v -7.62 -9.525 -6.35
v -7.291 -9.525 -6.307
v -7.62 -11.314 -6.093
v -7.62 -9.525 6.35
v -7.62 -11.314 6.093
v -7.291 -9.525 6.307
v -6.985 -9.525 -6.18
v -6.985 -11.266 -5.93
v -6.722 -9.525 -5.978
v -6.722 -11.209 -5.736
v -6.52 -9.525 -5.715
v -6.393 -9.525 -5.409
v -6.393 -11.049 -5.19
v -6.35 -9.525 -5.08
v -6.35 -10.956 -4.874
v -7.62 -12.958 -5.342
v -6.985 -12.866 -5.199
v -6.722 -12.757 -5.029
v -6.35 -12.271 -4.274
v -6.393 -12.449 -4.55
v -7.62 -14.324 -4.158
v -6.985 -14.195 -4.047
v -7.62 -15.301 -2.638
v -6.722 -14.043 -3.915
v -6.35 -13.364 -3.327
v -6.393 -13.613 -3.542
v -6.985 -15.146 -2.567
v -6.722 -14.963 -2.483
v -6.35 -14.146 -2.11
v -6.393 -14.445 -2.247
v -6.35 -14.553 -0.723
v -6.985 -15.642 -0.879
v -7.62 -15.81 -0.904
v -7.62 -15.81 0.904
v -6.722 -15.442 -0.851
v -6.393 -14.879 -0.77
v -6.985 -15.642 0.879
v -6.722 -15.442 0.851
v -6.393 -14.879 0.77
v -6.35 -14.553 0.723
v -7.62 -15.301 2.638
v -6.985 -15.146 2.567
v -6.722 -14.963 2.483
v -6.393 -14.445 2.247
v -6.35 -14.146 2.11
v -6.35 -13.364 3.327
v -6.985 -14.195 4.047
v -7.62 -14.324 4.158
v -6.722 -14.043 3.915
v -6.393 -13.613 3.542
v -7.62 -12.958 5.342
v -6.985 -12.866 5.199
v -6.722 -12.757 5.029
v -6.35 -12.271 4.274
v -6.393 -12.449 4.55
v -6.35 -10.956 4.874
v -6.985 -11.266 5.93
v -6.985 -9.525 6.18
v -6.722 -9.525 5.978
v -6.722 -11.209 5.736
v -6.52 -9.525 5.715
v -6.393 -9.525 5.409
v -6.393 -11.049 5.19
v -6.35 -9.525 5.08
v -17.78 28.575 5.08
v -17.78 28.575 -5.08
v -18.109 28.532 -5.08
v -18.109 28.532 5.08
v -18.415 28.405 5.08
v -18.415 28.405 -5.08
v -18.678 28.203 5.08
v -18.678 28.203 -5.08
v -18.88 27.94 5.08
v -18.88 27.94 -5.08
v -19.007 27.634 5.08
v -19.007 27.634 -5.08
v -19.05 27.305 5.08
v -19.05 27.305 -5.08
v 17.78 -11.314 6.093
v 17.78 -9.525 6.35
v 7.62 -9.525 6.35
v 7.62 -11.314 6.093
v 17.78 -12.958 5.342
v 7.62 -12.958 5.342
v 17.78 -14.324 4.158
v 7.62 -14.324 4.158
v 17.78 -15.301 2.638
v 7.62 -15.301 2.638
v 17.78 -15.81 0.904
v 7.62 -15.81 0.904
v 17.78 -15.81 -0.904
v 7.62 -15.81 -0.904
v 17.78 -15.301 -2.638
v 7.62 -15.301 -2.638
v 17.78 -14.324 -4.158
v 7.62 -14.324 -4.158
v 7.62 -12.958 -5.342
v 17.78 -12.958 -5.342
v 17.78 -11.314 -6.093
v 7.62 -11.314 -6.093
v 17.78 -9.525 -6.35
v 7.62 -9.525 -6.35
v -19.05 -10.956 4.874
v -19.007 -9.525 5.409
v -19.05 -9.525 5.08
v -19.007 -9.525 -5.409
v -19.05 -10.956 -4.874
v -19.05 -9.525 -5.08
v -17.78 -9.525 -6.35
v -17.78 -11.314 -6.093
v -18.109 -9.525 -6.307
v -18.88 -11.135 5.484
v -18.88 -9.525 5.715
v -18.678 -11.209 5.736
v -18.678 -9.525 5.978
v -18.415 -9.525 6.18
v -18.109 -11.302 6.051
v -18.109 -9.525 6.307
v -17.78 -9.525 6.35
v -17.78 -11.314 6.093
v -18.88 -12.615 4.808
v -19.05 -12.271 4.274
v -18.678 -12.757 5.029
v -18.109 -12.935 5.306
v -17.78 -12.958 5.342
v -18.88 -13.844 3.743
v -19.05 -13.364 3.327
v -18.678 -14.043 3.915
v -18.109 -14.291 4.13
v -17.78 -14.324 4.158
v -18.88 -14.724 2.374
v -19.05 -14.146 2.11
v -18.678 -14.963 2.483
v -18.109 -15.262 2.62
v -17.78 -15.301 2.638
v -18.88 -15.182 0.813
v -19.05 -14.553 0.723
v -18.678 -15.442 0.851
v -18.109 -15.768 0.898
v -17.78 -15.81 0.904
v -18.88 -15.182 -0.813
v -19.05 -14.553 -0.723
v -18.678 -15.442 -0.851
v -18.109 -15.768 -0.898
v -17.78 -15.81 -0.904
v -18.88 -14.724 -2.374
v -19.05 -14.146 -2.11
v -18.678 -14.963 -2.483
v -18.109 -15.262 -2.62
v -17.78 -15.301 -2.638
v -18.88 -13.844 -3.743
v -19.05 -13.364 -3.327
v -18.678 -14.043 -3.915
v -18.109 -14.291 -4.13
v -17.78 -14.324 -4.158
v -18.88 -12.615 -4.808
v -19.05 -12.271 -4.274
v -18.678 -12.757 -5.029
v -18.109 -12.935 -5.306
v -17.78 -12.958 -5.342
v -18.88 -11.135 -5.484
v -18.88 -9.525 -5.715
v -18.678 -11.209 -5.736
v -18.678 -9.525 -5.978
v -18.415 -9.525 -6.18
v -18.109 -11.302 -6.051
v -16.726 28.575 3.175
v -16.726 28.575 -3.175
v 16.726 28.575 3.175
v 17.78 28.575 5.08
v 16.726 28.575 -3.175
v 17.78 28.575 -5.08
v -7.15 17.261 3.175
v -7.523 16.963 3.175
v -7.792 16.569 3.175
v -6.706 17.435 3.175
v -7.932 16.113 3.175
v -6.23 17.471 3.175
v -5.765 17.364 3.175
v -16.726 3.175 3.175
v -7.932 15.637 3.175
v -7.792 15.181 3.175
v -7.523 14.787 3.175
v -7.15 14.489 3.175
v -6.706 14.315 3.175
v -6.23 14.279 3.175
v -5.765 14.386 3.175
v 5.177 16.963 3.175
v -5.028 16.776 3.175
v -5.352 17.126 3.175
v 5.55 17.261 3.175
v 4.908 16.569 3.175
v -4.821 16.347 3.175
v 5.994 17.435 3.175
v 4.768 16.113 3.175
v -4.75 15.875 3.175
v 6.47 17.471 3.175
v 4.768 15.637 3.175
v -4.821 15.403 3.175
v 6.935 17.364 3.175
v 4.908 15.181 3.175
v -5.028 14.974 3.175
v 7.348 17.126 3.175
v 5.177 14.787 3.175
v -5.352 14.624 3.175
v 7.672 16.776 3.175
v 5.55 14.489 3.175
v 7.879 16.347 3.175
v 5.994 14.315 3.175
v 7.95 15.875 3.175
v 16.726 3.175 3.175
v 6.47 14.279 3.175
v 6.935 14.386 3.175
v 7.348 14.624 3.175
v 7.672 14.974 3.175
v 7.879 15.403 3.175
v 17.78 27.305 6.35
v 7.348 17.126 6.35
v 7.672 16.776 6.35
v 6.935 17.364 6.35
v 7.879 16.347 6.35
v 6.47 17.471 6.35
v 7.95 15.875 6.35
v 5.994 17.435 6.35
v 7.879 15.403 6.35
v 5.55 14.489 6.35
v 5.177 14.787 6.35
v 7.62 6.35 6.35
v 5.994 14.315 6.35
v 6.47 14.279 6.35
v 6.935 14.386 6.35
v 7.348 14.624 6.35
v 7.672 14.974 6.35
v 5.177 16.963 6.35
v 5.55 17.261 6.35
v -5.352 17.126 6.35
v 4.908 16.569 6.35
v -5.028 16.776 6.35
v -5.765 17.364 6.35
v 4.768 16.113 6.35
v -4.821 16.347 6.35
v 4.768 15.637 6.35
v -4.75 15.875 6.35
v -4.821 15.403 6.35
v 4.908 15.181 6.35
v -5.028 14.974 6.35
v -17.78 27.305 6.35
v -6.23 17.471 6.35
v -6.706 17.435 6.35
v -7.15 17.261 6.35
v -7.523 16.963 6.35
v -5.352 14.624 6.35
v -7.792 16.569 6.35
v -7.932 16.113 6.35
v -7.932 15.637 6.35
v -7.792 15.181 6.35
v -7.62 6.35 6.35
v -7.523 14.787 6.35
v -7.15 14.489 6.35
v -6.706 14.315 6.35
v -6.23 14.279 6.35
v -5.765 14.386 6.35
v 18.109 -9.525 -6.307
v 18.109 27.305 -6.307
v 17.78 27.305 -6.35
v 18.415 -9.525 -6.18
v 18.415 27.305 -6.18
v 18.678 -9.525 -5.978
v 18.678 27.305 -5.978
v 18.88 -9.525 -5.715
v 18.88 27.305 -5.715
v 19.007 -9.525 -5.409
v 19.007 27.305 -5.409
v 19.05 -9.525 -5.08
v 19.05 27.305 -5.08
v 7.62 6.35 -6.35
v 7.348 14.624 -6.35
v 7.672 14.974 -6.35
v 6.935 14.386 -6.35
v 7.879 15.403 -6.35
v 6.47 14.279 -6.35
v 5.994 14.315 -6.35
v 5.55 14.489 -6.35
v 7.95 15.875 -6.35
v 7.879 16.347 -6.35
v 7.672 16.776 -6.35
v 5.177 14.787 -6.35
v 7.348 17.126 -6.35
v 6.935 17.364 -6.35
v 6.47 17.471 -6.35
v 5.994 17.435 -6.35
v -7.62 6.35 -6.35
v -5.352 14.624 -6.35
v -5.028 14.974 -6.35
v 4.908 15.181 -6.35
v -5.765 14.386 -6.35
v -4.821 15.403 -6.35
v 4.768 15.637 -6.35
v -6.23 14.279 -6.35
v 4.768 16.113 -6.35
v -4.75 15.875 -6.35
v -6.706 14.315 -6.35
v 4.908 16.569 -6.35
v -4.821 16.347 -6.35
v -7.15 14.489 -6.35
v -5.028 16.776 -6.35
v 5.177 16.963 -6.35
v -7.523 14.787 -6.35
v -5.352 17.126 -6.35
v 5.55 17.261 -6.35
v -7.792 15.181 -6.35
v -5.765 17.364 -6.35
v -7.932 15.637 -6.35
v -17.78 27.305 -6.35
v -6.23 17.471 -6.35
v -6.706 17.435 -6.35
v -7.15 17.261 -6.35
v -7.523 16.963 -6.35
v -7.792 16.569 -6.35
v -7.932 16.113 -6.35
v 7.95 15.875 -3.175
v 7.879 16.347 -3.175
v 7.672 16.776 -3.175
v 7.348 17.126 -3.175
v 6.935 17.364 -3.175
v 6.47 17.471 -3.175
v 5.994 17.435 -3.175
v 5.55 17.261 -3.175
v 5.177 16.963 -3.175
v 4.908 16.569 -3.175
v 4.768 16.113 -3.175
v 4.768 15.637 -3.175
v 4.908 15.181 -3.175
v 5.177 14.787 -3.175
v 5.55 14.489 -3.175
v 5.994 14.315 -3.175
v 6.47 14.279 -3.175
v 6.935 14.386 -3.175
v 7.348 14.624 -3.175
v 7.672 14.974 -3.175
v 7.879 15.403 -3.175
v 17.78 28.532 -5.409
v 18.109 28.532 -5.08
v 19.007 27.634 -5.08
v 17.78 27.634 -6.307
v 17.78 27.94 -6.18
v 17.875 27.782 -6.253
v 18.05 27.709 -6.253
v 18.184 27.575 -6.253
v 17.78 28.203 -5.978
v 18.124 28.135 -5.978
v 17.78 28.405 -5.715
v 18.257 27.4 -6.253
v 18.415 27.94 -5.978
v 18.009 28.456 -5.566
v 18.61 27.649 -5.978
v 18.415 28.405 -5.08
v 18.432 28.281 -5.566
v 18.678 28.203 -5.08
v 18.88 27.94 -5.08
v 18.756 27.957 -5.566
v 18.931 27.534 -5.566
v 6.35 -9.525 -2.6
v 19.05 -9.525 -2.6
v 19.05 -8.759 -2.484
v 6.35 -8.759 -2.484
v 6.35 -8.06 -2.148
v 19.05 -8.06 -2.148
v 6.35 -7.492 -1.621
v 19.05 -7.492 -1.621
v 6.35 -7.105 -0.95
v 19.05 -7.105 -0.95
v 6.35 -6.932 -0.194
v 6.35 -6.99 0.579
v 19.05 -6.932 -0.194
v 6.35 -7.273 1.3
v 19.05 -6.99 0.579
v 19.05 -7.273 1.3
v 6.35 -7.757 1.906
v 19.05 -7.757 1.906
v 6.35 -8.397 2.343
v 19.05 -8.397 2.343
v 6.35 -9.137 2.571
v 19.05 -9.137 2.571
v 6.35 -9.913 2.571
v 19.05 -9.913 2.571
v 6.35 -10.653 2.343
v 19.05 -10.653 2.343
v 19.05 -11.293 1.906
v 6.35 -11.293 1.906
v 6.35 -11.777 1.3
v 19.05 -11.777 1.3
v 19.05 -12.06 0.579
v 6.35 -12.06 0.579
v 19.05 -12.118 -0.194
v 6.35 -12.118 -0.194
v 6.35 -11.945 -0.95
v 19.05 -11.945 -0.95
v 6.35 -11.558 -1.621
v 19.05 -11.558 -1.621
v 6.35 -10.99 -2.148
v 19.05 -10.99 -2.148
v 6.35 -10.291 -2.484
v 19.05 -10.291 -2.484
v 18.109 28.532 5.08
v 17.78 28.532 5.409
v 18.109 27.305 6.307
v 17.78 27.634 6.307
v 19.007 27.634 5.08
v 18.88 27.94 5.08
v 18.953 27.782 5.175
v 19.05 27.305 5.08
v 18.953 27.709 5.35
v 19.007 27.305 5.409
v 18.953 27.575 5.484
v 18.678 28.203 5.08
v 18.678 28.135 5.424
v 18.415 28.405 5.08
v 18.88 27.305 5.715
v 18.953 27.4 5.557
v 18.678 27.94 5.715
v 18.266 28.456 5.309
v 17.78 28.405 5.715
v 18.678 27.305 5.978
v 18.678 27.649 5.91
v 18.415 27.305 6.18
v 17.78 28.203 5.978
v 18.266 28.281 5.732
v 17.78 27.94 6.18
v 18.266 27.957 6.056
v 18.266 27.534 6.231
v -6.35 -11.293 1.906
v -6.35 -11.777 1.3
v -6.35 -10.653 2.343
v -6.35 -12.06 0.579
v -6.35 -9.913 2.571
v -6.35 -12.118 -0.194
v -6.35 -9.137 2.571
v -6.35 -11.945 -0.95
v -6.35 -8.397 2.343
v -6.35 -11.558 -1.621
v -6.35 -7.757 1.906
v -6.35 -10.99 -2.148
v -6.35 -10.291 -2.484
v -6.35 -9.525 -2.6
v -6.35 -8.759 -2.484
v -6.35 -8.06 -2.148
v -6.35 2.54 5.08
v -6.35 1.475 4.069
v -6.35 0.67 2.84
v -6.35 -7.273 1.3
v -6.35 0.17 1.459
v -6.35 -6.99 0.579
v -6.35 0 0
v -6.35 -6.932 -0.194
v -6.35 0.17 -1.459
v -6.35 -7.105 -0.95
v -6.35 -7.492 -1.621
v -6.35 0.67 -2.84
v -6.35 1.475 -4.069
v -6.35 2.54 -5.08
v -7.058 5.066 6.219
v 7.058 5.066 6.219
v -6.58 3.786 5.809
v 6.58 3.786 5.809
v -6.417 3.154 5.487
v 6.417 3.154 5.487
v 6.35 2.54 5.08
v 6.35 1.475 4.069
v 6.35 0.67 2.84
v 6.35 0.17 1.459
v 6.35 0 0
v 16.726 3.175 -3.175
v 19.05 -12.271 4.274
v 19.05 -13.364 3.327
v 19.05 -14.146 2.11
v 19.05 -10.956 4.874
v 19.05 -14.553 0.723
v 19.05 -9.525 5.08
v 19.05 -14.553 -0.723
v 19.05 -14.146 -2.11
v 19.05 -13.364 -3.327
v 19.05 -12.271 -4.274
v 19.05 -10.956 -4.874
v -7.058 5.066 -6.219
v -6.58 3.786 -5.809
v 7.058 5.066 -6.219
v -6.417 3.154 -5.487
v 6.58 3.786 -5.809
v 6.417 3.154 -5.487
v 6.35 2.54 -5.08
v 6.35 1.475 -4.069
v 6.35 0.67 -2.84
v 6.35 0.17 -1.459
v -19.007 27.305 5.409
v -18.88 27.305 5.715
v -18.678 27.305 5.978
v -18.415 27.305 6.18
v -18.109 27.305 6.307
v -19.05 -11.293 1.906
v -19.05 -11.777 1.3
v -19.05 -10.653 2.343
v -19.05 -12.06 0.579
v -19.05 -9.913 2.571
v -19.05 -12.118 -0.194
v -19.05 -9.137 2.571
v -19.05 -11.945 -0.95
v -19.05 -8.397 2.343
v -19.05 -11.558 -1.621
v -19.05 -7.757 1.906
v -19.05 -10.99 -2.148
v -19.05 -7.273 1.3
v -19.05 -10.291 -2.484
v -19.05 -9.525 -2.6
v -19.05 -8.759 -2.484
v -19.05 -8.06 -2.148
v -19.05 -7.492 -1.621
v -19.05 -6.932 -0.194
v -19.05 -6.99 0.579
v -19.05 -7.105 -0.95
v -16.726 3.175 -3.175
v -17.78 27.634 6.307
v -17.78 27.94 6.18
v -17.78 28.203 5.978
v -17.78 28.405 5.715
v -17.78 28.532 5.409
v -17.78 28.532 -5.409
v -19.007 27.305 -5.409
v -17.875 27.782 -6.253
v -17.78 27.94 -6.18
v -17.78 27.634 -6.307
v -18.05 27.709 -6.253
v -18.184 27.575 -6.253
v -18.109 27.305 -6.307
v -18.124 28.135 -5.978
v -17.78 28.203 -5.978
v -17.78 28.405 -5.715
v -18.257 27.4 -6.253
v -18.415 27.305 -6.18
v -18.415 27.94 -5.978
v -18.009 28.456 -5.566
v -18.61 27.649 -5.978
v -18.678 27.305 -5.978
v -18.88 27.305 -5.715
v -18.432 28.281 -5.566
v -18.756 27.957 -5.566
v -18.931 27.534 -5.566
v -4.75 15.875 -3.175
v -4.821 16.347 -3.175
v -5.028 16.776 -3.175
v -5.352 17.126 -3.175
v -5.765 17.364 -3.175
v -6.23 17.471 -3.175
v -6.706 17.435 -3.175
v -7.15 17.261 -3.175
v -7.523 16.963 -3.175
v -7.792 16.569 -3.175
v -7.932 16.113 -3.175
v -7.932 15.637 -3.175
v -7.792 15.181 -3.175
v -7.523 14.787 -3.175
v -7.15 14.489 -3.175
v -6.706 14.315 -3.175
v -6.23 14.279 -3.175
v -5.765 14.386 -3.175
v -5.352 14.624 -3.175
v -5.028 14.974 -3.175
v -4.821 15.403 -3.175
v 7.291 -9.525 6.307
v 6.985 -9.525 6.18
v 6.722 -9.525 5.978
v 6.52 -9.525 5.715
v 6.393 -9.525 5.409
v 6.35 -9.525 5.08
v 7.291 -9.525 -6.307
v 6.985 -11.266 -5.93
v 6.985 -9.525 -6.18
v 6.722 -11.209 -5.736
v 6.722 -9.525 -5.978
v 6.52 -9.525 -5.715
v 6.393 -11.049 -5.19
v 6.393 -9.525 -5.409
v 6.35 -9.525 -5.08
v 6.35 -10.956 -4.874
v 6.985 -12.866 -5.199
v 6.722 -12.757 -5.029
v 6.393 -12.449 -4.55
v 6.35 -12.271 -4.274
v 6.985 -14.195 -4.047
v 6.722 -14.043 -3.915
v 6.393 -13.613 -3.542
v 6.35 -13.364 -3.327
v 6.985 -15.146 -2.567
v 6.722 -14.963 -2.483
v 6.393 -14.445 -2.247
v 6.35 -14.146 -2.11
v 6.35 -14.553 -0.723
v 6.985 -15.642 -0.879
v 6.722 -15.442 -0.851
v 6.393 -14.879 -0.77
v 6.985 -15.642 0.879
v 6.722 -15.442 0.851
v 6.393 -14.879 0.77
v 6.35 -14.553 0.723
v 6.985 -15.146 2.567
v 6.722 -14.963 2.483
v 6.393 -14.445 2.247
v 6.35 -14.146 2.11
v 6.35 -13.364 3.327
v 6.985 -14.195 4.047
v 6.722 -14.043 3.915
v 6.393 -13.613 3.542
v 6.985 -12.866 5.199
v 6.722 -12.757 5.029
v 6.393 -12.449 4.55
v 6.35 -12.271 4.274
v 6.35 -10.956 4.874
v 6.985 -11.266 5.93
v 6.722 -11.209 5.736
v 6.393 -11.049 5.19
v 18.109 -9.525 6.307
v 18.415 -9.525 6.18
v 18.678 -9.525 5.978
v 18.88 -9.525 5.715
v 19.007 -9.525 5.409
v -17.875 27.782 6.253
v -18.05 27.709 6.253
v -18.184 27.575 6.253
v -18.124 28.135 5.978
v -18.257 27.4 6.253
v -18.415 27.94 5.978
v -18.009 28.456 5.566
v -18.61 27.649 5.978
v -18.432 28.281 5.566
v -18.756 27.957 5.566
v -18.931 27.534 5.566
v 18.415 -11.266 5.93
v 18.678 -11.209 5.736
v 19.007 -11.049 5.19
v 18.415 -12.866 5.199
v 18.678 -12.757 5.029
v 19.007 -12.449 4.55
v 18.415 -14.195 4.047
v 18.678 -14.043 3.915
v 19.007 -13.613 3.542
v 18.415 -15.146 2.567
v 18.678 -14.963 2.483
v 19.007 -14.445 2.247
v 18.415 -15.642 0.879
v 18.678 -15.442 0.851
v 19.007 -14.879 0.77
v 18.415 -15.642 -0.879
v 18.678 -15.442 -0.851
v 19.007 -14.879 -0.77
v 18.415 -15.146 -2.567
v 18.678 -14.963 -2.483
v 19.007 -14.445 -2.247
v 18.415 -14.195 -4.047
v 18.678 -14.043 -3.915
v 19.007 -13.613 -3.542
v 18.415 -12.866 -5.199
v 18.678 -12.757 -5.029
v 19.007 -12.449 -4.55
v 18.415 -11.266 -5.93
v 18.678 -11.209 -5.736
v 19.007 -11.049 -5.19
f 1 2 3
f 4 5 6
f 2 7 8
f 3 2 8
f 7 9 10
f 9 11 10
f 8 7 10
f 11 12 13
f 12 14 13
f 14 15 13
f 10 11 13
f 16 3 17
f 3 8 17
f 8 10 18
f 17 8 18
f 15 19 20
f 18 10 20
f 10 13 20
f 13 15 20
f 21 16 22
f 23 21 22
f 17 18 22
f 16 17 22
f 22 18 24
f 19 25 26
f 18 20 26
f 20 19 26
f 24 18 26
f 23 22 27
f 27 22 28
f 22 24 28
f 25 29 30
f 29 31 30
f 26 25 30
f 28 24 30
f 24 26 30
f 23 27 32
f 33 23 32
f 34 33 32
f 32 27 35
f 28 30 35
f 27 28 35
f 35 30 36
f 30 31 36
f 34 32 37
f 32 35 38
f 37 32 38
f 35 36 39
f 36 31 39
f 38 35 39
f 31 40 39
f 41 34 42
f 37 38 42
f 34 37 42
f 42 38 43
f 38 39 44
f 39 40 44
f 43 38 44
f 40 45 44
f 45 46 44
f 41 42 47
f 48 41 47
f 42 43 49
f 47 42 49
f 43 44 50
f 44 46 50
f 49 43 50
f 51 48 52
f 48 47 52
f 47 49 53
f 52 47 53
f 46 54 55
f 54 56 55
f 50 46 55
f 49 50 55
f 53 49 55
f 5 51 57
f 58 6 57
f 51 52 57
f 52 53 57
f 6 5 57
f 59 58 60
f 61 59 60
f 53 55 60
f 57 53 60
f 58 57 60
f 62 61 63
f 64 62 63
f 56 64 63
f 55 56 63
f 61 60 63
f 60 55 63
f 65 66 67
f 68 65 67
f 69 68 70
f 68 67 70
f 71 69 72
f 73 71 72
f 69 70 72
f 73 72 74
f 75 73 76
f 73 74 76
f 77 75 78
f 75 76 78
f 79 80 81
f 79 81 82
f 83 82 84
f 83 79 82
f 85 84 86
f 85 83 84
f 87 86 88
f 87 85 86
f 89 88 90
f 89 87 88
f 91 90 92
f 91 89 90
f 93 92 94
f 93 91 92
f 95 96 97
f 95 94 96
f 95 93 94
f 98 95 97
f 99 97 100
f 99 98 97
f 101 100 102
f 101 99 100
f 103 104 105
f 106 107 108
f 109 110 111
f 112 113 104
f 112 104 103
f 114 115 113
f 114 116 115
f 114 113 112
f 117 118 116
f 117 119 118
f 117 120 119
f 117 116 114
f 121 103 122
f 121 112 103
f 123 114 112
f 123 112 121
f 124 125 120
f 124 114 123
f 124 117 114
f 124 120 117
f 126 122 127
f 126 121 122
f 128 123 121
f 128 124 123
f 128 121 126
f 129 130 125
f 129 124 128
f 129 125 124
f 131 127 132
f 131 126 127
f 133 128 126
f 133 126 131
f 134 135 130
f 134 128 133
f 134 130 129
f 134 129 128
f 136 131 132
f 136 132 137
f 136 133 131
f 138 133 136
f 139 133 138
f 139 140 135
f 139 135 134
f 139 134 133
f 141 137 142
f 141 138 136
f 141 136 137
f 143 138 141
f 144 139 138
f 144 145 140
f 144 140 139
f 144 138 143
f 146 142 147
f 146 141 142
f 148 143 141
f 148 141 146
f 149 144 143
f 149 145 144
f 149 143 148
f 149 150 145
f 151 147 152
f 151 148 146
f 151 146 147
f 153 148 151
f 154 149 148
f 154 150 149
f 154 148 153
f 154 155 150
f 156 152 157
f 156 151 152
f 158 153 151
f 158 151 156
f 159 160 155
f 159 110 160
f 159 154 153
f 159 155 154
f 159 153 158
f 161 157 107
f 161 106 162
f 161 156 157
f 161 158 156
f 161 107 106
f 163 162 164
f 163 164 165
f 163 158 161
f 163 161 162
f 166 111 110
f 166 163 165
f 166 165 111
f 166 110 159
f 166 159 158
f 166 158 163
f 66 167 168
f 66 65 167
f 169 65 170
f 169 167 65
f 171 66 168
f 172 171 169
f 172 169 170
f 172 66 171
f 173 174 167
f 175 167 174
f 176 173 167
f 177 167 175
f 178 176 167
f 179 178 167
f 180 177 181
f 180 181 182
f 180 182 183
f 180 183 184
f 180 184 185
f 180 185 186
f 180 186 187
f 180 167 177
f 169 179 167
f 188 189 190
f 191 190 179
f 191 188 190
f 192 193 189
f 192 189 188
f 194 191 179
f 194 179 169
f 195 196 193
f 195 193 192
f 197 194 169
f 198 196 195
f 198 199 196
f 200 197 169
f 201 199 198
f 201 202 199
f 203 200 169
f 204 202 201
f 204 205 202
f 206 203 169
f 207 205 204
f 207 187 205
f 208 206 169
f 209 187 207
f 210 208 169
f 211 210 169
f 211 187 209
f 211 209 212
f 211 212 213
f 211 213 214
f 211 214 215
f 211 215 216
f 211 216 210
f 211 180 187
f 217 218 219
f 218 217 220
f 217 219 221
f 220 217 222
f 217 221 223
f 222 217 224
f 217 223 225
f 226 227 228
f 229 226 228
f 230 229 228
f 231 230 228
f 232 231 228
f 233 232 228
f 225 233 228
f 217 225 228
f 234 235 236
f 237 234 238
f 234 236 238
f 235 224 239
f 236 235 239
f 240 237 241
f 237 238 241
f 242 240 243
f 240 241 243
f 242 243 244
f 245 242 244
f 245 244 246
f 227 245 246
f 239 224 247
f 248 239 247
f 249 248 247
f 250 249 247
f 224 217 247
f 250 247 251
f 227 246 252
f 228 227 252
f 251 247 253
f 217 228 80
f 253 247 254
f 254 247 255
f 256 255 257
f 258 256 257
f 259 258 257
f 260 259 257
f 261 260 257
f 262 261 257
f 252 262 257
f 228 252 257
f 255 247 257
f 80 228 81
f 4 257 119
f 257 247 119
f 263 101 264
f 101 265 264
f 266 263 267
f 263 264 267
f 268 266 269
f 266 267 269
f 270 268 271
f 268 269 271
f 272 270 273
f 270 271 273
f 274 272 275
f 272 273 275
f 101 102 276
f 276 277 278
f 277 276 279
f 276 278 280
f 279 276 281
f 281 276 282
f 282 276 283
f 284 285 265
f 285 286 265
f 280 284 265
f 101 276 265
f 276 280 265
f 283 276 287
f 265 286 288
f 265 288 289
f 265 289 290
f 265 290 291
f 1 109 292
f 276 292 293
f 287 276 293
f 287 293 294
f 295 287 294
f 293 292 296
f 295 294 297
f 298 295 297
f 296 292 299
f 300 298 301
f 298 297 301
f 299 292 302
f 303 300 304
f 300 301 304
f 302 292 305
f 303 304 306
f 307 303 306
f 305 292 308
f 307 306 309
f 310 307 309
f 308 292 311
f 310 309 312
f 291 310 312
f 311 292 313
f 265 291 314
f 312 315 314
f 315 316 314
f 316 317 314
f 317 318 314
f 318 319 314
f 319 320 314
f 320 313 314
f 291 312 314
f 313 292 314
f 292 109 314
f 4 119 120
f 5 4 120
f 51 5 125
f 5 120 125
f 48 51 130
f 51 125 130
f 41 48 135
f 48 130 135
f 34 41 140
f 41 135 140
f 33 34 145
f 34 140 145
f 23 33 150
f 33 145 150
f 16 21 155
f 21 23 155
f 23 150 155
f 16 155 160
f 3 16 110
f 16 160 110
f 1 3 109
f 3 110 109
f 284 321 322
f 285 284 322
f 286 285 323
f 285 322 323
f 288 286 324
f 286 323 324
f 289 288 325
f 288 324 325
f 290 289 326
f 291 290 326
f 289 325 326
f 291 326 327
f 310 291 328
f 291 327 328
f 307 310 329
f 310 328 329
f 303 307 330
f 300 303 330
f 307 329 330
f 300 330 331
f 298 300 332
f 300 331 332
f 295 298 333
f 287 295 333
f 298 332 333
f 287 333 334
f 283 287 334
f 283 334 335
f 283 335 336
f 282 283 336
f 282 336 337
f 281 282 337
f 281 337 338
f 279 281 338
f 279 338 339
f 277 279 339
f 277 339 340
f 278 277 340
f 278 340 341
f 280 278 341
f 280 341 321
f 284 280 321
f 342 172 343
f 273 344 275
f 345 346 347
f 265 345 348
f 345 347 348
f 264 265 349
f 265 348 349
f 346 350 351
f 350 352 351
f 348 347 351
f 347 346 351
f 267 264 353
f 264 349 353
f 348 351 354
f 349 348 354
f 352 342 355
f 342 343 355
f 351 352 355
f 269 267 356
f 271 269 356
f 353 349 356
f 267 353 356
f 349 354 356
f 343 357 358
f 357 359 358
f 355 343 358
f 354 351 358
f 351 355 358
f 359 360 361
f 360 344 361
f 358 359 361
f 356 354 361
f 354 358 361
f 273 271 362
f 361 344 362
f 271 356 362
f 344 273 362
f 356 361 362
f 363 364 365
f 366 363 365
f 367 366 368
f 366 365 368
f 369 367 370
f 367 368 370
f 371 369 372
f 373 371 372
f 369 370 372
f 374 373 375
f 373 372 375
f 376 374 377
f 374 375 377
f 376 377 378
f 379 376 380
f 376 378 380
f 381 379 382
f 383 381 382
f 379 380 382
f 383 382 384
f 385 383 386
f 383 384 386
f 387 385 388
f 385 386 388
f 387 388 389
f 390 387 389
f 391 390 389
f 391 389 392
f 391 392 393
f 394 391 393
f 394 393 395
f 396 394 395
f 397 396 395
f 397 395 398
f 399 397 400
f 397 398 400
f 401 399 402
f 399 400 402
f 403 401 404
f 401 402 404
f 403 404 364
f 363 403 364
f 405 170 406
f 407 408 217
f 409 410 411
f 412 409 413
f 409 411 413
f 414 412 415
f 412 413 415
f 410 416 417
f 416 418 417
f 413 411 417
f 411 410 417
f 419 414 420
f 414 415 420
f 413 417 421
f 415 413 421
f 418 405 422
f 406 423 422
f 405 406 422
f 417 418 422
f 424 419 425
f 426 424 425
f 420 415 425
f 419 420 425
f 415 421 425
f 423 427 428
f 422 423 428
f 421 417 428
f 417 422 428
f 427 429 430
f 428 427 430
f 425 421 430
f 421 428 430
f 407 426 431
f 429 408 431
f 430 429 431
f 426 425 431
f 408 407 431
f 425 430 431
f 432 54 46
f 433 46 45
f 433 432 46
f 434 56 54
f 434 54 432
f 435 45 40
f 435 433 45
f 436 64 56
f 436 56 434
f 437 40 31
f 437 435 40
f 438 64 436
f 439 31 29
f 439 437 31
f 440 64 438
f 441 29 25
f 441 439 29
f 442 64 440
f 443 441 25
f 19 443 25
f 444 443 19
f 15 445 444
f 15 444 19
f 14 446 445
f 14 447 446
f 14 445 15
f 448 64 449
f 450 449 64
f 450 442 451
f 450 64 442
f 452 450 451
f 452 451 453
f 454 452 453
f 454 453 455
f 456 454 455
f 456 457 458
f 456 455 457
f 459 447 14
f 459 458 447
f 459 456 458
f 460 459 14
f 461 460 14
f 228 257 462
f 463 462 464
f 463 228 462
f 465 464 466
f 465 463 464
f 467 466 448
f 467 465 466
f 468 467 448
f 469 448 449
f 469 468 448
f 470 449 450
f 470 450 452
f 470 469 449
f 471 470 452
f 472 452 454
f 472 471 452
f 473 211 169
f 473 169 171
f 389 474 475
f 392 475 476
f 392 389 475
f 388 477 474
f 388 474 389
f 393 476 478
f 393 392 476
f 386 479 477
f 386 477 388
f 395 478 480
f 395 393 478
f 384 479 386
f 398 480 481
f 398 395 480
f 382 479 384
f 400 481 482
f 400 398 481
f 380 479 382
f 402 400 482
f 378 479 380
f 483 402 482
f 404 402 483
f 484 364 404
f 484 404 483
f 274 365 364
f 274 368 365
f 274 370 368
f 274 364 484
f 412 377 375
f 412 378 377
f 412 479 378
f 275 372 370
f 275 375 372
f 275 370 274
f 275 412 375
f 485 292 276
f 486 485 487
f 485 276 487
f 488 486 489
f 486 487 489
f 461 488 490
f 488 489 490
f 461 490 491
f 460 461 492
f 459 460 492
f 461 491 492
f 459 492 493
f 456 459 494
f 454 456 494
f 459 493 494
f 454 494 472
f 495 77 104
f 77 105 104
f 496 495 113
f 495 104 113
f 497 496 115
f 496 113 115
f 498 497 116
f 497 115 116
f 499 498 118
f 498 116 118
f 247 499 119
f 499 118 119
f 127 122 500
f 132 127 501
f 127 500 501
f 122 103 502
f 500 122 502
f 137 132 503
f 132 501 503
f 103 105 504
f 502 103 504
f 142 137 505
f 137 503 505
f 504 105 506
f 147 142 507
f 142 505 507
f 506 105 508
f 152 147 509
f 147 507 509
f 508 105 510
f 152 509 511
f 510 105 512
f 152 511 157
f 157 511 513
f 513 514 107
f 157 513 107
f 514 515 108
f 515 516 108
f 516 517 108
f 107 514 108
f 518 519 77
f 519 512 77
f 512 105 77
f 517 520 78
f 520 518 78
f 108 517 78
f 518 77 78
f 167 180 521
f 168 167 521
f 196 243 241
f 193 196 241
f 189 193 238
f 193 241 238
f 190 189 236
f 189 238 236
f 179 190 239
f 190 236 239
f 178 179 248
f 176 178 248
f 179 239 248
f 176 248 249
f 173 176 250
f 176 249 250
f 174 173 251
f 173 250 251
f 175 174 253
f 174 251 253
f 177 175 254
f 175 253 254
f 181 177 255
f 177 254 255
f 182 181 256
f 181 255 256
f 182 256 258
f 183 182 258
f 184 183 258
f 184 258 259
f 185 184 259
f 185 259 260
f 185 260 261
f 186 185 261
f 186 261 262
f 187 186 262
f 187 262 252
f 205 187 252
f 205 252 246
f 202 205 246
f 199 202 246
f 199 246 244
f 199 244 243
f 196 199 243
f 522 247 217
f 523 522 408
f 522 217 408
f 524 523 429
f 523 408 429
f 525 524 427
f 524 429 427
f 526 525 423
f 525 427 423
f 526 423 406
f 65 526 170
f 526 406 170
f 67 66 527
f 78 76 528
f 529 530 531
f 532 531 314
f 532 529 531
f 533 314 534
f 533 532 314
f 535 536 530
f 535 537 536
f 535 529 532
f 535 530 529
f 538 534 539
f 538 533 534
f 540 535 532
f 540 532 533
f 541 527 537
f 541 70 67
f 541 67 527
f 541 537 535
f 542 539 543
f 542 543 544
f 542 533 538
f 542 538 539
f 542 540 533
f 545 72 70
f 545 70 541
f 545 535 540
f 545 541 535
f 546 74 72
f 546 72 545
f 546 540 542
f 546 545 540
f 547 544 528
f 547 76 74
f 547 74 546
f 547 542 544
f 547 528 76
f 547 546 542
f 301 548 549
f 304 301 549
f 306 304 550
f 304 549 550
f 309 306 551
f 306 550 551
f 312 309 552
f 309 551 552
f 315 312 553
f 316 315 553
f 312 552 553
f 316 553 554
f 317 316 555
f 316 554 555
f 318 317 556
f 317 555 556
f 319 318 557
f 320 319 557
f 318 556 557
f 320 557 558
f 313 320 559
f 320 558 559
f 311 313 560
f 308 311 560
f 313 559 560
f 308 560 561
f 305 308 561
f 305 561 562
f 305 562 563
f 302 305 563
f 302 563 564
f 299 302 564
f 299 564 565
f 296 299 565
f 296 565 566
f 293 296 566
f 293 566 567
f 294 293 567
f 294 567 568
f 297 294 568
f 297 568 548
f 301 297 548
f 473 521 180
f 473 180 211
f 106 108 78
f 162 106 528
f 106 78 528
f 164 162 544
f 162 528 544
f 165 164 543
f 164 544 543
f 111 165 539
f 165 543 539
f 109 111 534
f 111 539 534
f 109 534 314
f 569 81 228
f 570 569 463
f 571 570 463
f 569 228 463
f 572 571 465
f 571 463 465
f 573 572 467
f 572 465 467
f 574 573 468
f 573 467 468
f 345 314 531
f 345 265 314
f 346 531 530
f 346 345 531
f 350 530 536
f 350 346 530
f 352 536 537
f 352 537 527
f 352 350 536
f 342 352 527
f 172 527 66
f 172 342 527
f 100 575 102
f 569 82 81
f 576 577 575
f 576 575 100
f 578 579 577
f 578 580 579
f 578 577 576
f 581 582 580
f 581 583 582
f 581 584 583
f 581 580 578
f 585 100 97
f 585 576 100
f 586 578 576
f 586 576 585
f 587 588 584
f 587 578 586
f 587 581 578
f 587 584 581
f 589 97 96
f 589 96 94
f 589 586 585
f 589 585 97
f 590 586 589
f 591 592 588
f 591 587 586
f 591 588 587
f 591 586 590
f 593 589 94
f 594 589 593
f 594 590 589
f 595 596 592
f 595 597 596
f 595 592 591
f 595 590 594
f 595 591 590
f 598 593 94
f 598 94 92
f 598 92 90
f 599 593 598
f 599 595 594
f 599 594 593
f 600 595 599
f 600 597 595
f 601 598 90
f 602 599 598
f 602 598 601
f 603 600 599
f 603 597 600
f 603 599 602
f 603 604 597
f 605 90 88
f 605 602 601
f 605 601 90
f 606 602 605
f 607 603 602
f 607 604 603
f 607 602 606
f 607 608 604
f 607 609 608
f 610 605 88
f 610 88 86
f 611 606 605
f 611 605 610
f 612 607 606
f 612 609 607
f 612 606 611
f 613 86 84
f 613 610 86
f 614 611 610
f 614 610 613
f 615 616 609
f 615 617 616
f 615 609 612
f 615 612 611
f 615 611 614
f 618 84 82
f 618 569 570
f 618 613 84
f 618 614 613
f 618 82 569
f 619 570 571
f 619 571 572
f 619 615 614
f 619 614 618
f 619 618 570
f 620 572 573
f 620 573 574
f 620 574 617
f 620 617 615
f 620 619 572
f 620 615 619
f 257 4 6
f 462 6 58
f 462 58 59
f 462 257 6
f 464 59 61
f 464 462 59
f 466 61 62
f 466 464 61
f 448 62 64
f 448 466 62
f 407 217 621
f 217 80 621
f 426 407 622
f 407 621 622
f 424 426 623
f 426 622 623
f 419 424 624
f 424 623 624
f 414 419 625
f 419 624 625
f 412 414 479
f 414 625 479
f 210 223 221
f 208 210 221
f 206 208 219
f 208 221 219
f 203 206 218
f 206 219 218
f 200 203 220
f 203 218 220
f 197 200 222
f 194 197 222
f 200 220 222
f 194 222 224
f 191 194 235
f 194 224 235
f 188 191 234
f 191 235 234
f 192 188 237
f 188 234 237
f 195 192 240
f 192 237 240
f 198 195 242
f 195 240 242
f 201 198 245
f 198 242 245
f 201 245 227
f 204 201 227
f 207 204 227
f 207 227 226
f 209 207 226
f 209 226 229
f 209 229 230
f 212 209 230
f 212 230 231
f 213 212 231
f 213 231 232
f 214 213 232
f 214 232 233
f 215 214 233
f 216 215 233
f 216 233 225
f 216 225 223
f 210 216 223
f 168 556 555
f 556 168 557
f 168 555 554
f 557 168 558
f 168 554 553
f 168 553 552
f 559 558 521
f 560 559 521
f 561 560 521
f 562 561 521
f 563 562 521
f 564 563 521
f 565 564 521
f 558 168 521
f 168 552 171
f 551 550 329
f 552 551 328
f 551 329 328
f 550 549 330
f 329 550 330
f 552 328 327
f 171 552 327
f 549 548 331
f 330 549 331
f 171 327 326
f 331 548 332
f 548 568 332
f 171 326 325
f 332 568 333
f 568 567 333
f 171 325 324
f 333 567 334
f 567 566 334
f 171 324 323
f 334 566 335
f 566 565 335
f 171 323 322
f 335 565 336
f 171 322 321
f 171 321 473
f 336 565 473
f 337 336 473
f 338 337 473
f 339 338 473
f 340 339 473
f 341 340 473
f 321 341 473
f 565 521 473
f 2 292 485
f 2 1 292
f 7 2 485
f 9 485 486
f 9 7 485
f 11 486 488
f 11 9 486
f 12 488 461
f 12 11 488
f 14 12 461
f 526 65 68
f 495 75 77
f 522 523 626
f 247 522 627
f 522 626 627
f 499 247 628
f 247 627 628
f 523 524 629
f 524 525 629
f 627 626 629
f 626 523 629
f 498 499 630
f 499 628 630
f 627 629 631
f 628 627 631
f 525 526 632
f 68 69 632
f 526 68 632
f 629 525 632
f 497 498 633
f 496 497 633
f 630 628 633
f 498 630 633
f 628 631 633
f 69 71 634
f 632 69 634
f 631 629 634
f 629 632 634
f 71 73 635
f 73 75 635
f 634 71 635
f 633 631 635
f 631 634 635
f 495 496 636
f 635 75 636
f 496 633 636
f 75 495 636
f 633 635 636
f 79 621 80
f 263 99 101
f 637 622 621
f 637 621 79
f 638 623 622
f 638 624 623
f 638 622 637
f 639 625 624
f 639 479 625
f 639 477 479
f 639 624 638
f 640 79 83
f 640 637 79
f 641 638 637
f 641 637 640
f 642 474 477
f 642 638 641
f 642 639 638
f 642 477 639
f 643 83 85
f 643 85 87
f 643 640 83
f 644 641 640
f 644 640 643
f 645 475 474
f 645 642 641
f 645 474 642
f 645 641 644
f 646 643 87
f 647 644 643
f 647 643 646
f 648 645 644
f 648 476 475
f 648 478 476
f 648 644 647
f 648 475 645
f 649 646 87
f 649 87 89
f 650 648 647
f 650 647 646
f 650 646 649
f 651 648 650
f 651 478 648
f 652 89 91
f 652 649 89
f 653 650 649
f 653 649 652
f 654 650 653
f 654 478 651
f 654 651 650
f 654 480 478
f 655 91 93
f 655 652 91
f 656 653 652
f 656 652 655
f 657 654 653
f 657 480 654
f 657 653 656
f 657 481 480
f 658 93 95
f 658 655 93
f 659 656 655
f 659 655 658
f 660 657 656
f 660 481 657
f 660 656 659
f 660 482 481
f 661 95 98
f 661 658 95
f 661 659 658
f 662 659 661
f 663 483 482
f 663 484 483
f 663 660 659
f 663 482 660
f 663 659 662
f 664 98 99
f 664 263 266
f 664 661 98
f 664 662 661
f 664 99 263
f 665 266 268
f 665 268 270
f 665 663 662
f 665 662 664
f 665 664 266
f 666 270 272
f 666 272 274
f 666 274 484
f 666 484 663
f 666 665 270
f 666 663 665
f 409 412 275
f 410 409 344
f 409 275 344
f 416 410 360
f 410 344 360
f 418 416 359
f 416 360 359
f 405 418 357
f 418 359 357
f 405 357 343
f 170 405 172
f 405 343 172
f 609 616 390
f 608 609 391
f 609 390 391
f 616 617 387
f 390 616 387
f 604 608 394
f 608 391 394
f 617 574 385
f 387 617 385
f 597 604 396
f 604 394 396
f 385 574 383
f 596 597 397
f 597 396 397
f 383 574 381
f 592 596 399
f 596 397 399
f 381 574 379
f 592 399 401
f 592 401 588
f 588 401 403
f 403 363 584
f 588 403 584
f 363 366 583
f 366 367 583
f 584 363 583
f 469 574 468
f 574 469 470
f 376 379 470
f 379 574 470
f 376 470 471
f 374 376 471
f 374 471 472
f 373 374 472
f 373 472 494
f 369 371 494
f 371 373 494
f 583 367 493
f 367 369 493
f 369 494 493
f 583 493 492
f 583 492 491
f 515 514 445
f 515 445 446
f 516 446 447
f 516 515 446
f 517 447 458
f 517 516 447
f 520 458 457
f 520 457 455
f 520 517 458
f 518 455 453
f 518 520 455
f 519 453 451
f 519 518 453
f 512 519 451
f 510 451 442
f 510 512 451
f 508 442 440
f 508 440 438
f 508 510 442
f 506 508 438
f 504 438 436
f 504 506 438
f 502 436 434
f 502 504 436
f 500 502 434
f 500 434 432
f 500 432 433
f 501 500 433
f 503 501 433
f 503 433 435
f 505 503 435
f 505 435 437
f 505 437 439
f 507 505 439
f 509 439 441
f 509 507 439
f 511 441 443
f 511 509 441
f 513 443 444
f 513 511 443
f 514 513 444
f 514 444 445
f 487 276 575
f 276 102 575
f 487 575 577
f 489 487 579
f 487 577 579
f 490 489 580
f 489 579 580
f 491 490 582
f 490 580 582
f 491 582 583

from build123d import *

# Parameters (mm, degrees)
ESQUISSE1_W             = 38.1
ESQUISSE1_H             = 12.7
BOSS_EXTRU_1_DEPTH      = 3.175
ESQUISSE2_W             = 38.1
ESQUISSE2_H             = 12.7
ESQUISSE2_W_2           = 33.4518
ESQUISSE2_H_2           = 6.35
BOSS_EXTRU_2_DEPTH      = 25.4
ESQUISSE3_R             = 1.6
ENL_V_MAT_EXTRU_1_DEPTH = 25.4
ESQUISSE4_R             = 2.6
BOSS_EXTRU_3_DEPTH      = 12.7
CONG_1_R                = 6.35
CONG_2_R                = 1.27


with BuildPart() as part:
    # Esquisse1 → Boss.-Extru.1 (new body)
    with BuildSketch(Plane(origin=(0, 0, 0), x_dir=(1, 0, 0), z_dir=(0, 1, 0))):
        Rectangle(ESQUISSE1_W, ESQUISSE1_H)
    extrude(amount=BOSS_EXTRU_1_DEPTH)

    # Esquisse2 → Boss.-Extru.2 (add)
    with BuildSketch(Plane(origin=(0, 3.175, 0), x_dir=(1, 0, 0), z_dir=(0, 1, 0))):
        Rectangle(ESQUISSE2_W, ESQUISSE2_H)
        Rectangle(ESQUISSE2_W_2, ESQUISSE2_H_2, mode=Mode.SUBTRACT)
    extrude(amount=BOSS_EXTRU_2_DEPTH)

    # Esquisse3 → Enlèv. mat.-Extru.1 (cut)
    with BuildSketch(Plane.XY.offset(6.35)):
        with Locations((-6.35, 15.875)):
            Circle(ESQUISSE3_R)
        with Locations((6.35, 15.875)):
            Circle(ESQUISSE3_R)
    extrude(amount=-ENL_V_MAT_EXTRU_1_DEPTH, mode=Mode.SUBTRACT)

    # Esquisse4 → Boss.-Extru.3 (add)
    with BuildSketch(Plane(origin=(19.05, 0, 0), x_dir=(0, 0, -1), z_dir=(1, 0, 0))):
        with BuildLine():
            Line((-6.35, 0), (-6.35, -9.525))
            ThreePointArc((-6.35, -9.525), (0, -15.875), (6.35, -9.525))
            Line((6.35, -9.525), (6.35, 0))
            Line((6.35, 0), (-6.35, 0))
        make_face()
        with Locations((0, -9.525)):
            Circle(ESQUISSE4_R, mode=Mode.SUBTRACT)
    boss_extru_3 = extrude(amount=-BOSS_EXTRU_3_DEPTH)

    # Symétrie1: Boss.-Extru.3 across plane
    add(boss_extru_3.mirror(Plane(origin=(0, 0, 0), x_dir=(0, 0, 1), z_dir=(1, 0, 0))))

    # Congé1
    cong_1_edges = [part.edges().sort_by_distance(p)[0] for p in [
        (0, 0, -6.35),
        (0, 0, 6.35),
    ]]
    fillet(cong_1_edges, radius=CONG_1_R - 0.0001)  # a hair under: the kernel refuses the full size

    # Congé2
    cong_2_edges = [part.edges().sort_by_distance(p)[0] for p in [
        (-19.05, 28.575, 0),
        (0, 28.575, 6.35),
        (19.05, 28.575, 0),
        (0, 28.575, -6.35),
        (6.35, -1.58755, -6.35),
        (6.35, -15.875, 0),
        (6.35, -1.58755, 6.35),
        (19.05, -15.875, 0),
        (-6.35, -1.58755, 6.35),
        (-6.35, -15.875, 0),
        (-6.35, -1.58755, -6.35),
        (-19.05, -15.875, 0),
        (19.05, 9.525, 6.35),
        (-19.05, 9.525, 6.35),
        (-19.05, 9.525, -6.35),
        (19.05, 9.525, -6.35),
    ]]
    fillet(cong_2_edges, radius=CONG_2_R)


solid = part.part
